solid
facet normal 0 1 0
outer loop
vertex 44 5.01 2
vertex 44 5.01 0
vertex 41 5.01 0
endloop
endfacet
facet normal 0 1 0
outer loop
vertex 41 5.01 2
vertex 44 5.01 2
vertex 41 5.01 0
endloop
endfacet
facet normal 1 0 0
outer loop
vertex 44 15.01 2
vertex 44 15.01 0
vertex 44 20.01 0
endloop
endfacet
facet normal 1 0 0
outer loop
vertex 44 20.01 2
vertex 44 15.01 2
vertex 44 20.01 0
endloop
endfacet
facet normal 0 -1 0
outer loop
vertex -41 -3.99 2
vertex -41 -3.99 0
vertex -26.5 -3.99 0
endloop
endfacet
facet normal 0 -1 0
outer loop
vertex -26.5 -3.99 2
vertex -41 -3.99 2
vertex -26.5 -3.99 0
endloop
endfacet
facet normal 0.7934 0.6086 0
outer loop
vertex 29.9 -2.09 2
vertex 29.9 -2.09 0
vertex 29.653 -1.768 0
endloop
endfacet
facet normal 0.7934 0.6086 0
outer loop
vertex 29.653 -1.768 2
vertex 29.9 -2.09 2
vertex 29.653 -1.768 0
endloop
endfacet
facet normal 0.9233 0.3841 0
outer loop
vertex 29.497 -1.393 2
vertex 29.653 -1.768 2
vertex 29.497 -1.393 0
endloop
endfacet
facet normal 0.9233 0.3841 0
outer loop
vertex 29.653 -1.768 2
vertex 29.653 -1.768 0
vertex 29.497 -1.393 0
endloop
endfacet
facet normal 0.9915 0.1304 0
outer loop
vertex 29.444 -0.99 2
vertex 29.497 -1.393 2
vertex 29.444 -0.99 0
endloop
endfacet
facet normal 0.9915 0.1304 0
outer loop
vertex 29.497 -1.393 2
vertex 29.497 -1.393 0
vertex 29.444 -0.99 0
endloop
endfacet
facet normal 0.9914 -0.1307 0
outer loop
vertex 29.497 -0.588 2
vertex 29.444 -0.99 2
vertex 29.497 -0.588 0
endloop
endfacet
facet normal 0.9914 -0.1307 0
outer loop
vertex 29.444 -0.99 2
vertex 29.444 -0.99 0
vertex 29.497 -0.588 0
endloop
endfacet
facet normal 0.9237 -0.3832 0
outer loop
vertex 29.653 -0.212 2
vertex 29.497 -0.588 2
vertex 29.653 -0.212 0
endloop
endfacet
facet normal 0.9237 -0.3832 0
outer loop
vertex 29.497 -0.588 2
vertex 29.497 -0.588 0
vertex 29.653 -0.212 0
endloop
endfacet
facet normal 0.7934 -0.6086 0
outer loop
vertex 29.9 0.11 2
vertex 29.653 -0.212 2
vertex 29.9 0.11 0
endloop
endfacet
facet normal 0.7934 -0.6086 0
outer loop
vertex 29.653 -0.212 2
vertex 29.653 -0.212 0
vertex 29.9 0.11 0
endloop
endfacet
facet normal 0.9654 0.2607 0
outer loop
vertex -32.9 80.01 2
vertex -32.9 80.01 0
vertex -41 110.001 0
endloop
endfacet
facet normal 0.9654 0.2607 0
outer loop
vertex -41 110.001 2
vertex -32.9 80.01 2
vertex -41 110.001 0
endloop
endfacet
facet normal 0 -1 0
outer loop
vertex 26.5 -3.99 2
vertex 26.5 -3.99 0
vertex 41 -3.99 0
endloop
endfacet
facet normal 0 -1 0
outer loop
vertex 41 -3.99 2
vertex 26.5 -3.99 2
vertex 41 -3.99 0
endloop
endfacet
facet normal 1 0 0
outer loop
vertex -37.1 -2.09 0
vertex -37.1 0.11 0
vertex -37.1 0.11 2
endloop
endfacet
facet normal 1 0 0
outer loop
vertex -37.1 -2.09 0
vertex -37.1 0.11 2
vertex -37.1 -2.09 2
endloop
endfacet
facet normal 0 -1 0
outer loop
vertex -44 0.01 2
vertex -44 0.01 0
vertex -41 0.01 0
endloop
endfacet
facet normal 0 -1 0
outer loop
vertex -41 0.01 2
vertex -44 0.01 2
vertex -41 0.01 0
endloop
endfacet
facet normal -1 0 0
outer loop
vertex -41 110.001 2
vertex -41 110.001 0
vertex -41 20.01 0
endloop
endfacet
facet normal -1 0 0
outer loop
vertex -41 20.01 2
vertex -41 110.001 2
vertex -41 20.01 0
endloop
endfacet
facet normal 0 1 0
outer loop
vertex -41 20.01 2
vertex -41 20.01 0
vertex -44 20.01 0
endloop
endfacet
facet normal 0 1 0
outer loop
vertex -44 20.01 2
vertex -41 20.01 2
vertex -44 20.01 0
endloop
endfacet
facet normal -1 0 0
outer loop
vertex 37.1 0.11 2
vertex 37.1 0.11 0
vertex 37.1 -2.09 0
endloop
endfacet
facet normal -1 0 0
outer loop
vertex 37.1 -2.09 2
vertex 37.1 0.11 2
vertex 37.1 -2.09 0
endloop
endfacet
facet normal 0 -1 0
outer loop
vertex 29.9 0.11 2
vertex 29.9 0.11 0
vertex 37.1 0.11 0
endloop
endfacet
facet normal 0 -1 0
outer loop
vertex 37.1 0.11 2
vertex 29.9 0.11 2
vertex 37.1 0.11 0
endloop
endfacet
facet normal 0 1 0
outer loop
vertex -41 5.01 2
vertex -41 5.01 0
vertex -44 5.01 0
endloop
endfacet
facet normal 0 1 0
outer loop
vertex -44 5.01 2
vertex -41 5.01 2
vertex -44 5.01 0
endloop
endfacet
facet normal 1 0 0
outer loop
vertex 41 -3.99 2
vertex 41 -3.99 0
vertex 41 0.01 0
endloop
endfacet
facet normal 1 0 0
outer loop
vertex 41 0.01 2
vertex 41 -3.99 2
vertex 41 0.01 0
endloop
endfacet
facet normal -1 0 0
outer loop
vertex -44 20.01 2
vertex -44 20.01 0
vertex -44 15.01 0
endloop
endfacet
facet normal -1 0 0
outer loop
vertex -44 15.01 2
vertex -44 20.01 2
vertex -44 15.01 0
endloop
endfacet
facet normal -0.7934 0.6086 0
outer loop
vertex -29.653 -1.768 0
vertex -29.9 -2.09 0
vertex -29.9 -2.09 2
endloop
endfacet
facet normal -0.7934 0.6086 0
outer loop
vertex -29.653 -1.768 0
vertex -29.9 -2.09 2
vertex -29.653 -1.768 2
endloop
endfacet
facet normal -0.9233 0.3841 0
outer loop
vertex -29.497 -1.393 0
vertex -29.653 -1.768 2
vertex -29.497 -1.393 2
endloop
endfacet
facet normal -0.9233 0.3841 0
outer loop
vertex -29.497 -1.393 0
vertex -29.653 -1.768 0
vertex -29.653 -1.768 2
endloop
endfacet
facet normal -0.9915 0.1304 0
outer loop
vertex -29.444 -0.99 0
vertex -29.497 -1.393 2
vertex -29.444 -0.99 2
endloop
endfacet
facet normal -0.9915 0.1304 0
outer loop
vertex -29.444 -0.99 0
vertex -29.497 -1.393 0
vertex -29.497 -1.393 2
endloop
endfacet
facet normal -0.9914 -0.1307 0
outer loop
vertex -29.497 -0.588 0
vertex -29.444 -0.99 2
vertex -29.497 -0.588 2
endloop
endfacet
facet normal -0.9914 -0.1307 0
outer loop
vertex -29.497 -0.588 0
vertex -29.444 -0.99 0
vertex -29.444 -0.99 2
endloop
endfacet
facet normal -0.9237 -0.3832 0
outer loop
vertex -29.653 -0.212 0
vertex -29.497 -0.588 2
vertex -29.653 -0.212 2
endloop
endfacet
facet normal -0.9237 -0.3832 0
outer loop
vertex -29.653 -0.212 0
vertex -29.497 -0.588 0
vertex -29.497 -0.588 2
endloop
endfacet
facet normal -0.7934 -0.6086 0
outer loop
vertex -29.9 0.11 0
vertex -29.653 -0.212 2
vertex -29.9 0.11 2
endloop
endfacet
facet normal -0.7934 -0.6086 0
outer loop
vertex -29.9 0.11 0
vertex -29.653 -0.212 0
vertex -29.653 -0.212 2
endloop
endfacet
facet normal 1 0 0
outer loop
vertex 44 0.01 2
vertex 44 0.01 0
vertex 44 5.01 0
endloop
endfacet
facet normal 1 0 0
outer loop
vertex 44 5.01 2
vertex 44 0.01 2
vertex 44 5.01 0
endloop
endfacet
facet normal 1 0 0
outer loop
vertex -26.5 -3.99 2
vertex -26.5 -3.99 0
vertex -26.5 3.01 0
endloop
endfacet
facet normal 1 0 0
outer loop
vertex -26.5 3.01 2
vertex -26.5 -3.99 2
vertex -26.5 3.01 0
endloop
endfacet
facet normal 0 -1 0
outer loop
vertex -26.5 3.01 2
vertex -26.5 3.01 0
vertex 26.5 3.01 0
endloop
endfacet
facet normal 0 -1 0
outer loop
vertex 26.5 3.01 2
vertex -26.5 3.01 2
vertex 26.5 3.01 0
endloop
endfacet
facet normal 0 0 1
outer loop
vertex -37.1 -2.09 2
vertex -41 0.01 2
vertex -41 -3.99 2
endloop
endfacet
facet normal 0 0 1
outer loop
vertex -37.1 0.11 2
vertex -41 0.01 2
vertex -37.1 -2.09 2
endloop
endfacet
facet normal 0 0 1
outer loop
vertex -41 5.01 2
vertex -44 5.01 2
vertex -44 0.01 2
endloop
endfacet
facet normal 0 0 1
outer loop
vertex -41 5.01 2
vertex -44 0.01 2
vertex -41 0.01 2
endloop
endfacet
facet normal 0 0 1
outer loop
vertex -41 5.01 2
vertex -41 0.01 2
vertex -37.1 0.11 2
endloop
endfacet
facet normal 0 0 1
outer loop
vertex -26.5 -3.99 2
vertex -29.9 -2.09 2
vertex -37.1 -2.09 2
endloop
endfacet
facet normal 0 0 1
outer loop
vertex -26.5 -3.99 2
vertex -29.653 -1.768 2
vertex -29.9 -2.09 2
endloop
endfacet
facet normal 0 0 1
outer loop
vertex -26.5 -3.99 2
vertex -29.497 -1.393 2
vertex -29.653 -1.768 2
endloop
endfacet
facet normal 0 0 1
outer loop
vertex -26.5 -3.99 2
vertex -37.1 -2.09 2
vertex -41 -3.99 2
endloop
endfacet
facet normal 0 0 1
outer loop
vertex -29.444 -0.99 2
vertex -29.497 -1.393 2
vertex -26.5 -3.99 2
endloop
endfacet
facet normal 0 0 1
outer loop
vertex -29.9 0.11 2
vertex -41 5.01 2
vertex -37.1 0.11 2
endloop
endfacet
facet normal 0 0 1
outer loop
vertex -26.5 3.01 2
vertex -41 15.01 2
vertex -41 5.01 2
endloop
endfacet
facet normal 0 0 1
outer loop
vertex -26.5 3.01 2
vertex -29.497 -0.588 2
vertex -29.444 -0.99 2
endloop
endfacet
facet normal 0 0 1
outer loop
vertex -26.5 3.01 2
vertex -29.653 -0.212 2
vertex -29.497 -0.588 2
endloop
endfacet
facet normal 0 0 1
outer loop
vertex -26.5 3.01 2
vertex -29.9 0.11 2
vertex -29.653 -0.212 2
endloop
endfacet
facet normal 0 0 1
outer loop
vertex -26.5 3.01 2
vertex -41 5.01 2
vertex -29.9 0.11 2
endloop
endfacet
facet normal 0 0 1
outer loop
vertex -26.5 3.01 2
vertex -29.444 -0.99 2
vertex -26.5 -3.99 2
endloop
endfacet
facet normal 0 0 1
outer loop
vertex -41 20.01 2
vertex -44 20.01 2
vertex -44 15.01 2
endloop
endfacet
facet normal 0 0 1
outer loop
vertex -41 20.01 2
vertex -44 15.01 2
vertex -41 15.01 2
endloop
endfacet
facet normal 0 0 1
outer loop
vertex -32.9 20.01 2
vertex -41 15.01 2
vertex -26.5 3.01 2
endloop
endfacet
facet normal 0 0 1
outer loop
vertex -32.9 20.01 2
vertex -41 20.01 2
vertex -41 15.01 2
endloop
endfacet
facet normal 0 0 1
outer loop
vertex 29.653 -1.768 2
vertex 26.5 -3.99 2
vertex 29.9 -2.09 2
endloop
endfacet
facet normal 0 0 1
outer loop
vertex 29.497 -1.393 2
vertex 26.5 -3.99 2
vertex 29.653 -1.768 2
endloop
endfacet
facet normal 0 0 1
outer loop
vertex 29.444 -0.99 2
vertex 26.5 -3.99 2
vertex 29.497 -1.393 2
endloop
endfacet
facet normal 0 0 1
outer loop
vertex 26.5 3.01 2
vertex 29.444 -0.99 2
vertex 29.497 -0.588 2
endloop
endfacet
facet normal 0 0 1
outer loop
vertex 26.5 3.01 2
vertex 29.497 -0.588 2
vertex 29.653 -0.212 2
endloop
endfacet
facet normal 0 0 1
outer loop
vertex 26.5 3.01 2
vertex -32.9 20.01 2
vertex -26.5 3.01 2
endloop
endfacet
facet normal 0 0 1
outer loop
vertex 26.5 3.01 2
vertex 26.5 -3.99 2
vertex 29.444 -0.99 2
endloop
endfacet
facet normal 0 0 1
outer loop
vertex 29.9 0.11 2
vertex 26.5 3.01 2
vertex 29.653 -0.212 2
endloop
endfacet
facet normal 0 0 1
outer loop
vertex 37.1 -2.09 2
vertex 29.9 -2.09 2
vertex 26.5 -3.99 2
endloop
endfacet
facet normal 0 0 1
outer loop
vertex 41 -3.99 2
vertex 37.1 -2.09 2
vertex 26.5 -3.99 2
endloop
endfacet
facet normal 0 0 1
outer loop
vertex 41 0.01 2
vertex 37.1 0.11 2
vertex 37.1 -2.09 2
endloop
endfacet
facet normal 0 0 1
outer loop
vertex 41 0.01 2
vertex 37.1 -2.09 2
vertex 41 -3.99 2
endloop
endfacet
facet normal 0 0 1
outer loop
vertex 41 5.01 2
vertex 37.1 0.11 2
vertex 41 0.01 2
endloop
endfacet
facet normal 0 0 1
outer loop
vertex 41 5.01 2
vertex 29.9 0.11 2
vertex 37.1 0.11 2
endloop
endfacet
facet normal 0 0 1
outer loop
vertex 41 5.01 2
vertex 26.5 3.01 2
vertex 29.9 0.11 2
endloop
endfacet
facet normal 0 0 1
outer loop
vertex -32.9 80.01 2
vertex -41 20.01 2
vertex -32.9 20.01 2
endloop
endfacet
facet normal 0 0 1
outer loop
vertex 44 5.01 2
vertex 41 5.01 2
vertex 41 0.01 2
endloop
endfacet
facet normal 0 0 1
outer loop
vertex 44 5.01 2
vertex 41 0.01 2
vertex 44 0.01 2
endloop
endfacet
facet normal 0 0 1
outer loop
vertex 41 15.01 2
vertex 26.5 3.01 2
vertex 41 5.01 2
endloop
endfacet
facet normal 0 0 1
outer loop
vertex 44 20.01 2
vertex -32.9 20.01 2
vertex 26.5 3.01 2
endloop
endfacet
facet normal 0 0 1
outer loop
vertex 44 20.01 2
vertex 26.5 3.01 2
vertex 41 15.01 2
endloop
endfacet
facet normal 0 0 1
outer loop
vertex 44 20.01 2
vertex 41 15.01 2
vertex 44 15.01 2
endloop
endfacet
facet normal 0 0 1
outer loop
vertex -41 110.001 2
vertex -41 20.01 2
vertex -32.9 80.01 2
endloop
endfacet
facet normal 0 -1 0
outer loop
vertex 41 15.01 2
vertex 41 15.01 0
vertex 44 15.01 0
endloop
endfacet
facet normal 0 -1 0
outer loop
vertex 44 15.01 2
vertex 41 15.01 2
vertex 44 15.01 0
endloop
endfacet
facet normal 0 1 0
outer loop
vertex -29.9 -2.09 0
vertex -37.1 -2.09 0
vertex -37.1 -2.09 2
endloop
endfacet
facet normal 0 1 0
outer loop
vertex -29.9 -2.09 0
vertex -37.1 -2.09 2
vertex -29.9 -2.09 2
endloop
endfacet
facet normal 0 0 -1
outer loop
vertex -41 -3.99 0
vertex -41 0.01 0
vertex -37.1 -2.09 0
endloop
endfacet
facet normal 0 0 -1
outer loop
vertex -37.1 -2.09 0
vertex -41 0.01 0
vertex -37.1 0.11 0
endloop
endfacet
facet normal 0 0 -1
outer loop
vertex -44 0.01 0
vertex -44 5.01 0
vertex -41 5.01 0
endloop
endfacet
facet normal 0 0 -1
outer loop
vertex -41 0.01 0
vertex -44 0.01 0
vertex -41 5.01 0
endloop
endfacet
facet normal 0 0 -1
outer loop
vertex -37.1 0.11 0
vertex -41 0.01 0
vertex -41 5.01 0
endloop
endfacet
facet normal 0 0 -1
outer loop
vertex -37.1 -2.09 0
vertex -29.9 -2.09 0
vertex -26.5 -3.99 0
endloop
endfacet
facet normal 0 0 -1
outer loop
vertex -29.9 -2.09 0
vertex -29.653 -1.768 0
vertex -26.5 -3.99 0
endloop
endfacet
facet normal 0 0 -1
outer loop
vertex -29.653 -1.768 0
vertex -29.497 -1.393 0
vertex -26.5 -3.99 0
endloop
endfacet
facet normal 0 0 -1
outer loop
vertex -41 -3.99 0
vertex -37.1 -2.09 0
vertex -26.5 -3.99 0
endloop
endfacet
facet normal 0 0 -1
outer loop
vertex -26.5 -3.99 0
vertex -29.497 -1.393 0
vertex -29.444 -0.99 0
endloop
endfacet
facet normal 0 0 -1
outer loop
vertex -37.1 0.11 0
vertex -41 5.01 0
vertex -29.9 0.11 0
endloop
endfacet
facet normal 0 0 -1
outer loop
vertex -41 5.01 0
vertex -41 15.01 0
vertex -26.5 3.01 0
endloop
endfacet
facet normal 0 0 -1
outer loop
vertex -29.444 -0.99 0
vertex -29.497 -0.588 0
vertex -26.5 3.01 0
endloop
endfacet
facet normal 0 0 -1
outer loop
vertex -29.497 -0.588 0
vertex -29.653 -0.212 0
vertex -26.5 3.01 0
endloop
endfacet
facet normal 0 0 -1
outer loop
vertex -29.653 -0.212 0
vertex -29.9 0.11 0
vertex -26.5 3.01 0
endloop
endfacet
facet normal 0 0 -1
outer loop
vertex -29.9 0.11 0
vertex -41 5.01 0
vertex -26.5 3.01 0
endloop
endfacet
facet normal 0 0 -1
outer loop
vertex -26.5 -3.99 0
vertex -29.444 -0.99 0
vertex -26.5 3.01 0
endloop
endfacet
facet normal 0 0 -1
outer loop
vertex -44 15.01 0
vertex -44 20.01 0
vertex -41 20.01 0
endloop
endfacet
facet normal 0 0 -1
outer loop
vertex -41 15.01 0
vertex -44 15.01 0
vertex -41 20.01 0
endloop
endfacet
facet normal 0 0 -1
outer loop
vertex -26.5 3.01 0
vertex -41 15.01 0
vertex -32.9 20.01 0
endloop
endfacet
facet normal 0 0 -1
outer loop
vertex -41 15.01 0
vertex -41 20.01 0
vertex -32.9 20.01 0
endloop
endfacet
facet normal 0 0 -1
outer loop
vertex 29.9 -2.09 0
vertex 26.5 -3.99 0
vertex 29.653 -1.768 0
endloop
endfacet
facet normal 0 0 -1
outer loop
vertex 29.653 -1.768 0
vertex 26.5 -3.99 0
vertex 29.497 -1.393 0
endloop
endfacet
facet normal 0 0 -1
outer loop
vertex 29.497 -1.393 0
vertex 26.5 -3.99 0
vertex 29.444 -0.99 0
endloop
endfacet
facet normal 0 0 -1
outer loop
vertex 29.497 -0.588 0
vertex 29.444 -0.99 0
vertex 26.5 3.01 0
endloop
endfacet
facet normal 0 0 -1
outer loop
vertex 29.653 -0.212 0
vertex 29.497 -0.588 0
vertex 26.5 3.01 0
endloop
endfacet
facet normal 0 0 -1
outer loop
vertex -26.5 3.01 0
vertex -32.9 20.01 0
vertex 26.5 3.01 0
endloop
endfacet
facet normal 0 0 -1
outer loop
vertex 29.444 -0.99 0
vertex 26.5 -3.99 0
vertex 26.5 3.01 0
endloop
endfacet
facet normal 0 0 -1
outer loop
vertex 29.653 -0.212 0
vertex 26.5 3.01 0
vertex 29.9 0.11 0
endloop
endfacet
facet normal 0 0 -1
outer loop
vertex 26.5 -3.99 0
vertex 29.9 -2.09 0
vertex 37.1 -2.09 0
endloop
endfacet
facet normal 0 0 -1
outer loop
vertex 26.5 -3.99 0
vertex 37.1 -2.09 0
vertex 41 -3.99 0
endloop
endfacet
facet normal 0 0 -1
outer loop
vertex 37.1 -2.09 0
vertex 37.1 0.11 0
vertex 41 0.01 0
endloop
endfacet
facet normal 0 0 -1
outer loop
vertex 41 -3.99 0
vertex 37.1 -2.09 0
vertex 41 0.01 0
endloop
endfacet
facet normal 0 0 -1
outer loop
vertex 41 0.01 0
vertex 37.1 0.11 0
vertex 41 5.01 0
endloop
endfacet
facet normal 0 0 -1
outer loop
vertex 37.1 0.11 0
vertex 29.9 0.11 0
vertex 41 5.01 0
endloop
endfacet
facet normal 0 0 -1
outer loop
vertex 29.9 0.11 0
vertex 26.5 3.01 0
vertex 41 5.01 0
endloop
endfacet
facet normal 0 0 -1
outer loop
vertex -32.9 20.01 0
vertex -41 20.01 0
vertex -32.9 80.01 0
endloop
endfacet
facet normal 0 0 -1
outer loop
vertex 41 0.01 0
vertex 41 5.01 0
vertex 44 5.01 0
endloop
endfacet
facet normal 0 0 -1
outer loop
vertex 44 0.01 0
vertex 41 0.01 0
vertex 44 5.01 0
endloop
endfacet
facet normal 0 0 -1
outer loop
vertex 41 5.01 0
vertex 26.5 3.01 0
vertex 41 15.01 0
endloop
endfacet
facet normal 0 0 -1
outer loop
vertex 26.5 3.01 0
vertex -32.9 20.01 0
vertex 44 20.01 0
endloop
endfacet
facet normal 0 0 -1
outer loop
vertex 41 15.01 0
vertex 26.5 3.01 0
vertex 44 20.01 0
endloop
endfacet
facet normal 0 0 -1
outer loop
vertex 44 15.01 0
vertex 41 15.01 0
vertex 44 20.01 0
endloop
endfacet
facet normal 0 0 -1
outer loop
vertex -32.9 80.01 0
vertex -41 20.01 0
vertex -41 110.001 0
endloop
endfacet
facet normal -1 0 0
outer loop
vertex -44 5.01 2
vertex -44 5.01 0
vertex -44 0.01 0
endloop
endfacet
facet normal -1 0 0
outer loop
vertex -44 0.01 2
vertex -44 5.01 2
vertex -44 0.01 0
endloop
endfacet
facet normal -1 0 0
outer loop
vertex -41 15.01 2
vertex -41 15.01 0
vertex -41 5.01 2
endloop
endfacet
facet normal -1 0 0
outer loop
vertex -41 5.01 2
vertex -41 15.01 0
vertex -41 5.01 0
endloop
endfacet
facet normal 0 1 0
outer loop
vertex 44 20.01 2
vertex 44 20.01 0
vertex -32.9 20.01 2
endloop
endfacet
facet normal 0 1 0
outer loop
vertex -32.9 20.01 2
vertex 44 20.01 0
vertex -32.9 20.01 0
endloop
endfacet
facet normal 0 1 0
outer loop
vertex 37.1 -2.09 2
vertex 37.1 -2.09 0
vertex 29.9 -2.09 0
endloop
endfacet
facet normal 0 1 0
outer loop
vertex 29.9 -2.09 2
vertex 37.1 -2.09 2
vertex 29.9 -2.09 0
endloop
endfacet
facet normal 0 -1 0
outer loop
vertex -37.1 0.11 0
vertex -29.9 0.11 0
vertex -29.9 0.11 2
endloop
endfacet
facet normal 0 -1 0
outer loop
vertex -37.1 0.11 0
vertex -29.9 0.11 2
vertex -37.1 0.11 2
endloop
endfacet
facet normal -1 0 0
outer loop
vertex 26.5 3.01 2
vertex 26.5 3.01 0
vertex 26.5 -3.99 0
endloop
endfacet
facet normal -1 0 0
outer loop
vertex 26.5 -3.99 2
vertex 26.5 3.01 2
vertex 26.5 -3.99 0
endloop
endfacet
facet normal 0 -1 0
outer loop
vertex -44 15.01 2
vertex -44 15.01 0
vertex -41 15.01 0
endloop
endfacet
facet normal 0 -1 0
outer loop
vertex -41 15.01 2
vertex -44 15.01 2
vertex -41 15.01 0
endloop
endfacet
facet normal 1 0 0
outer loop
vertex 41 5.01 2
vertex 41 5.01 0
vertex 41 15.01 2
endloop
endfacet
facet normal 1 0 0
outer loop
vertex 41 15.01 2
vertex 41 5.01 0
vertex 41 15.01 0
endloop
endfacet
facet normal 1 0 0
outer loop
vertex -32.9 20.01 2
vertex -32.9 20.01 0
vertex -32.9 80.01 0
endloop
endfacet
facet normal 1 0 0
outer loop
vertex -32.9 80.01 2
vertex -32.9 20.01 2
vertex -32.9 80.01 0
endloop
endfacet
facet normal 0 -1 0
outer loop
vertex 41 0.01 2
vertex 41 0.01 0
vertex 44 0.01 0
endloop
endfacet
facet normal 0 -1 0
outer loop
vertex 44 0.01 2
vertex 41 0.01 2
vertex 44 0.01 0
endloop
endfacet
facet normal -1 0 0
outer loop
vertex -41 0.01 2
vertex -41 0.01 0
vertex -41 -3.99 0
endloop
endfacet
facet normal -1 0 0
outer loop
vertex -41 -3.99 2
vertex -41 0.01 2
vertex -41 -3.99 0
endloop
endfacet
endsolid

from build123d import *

# Parameters (mm, degrees)
EXTRUDE_1_DEPTH = 2


with BuildPart() as part:
    # 草图3 → 凸台-拉伸1 (new body)
    with BuildSketch(Plane.XY):
        Polygon((41, 20.009783315), (-32.9, 20.009783315), (-32.9, 80.009783315), (-41, 110.001113679), (-41, 60.009783315), (-41, 20.009783315), (-44, 20.009783315), (-44, 15.009783315), (-41, 15.009783315), (-41, 10.009783315), (-41, 7.009783315), (-41, 5.009783315), (-44, 5.009783315), (-44, 0.009783315), (-41, 0.009783315), (-41, -3.990216685), (-26.5, -3.990216685), (-26.5, 3.009783315), (26.5, 3.009783315), (26.5, -3.990216685), (41, -3.990216685), (41, 0.009783315), (44, 0.009783315), (44, 5.009783315), (41, 5.009783315), (41, 7.009783315), (41, 10.009783315), (41, 15.009783315), (44, 15.009783315), (44, 20.009783315), align=None)
        with BuildLine():
            Line((-37.1, -2.090216685), (-29.9, -2.090216685))
            ThreePointArc((-29.9, -2.090216685), (-29.444365081, -0.990216685), (-29.9, 0.109783315))
            Line((-29.9, 0.109783315), (-37.1, 0.109783315))
            Line((-37.1, 0.109783315), (-37.1, -2.090216685))
        make_face(mode=Mode.SUBTRACT)
        with BuildLine():
            Line((37.1, -2.090216685), (29.9, -2.090216685))
            ThreePointArc((29.9, -2.090216685), (29.444365081, -0.990216685), (29.9, 0.109783315))
            Line((29.9, 0.109783315), (37.1, 0.109783315))
            Line((37.1, 0.109783315), (37.1, -2.090216685))
        make_face(mode=Mode.SUBTRACT)
    extrude(amount=EXTRUDE_1_DEPTH)


solid = part.part
